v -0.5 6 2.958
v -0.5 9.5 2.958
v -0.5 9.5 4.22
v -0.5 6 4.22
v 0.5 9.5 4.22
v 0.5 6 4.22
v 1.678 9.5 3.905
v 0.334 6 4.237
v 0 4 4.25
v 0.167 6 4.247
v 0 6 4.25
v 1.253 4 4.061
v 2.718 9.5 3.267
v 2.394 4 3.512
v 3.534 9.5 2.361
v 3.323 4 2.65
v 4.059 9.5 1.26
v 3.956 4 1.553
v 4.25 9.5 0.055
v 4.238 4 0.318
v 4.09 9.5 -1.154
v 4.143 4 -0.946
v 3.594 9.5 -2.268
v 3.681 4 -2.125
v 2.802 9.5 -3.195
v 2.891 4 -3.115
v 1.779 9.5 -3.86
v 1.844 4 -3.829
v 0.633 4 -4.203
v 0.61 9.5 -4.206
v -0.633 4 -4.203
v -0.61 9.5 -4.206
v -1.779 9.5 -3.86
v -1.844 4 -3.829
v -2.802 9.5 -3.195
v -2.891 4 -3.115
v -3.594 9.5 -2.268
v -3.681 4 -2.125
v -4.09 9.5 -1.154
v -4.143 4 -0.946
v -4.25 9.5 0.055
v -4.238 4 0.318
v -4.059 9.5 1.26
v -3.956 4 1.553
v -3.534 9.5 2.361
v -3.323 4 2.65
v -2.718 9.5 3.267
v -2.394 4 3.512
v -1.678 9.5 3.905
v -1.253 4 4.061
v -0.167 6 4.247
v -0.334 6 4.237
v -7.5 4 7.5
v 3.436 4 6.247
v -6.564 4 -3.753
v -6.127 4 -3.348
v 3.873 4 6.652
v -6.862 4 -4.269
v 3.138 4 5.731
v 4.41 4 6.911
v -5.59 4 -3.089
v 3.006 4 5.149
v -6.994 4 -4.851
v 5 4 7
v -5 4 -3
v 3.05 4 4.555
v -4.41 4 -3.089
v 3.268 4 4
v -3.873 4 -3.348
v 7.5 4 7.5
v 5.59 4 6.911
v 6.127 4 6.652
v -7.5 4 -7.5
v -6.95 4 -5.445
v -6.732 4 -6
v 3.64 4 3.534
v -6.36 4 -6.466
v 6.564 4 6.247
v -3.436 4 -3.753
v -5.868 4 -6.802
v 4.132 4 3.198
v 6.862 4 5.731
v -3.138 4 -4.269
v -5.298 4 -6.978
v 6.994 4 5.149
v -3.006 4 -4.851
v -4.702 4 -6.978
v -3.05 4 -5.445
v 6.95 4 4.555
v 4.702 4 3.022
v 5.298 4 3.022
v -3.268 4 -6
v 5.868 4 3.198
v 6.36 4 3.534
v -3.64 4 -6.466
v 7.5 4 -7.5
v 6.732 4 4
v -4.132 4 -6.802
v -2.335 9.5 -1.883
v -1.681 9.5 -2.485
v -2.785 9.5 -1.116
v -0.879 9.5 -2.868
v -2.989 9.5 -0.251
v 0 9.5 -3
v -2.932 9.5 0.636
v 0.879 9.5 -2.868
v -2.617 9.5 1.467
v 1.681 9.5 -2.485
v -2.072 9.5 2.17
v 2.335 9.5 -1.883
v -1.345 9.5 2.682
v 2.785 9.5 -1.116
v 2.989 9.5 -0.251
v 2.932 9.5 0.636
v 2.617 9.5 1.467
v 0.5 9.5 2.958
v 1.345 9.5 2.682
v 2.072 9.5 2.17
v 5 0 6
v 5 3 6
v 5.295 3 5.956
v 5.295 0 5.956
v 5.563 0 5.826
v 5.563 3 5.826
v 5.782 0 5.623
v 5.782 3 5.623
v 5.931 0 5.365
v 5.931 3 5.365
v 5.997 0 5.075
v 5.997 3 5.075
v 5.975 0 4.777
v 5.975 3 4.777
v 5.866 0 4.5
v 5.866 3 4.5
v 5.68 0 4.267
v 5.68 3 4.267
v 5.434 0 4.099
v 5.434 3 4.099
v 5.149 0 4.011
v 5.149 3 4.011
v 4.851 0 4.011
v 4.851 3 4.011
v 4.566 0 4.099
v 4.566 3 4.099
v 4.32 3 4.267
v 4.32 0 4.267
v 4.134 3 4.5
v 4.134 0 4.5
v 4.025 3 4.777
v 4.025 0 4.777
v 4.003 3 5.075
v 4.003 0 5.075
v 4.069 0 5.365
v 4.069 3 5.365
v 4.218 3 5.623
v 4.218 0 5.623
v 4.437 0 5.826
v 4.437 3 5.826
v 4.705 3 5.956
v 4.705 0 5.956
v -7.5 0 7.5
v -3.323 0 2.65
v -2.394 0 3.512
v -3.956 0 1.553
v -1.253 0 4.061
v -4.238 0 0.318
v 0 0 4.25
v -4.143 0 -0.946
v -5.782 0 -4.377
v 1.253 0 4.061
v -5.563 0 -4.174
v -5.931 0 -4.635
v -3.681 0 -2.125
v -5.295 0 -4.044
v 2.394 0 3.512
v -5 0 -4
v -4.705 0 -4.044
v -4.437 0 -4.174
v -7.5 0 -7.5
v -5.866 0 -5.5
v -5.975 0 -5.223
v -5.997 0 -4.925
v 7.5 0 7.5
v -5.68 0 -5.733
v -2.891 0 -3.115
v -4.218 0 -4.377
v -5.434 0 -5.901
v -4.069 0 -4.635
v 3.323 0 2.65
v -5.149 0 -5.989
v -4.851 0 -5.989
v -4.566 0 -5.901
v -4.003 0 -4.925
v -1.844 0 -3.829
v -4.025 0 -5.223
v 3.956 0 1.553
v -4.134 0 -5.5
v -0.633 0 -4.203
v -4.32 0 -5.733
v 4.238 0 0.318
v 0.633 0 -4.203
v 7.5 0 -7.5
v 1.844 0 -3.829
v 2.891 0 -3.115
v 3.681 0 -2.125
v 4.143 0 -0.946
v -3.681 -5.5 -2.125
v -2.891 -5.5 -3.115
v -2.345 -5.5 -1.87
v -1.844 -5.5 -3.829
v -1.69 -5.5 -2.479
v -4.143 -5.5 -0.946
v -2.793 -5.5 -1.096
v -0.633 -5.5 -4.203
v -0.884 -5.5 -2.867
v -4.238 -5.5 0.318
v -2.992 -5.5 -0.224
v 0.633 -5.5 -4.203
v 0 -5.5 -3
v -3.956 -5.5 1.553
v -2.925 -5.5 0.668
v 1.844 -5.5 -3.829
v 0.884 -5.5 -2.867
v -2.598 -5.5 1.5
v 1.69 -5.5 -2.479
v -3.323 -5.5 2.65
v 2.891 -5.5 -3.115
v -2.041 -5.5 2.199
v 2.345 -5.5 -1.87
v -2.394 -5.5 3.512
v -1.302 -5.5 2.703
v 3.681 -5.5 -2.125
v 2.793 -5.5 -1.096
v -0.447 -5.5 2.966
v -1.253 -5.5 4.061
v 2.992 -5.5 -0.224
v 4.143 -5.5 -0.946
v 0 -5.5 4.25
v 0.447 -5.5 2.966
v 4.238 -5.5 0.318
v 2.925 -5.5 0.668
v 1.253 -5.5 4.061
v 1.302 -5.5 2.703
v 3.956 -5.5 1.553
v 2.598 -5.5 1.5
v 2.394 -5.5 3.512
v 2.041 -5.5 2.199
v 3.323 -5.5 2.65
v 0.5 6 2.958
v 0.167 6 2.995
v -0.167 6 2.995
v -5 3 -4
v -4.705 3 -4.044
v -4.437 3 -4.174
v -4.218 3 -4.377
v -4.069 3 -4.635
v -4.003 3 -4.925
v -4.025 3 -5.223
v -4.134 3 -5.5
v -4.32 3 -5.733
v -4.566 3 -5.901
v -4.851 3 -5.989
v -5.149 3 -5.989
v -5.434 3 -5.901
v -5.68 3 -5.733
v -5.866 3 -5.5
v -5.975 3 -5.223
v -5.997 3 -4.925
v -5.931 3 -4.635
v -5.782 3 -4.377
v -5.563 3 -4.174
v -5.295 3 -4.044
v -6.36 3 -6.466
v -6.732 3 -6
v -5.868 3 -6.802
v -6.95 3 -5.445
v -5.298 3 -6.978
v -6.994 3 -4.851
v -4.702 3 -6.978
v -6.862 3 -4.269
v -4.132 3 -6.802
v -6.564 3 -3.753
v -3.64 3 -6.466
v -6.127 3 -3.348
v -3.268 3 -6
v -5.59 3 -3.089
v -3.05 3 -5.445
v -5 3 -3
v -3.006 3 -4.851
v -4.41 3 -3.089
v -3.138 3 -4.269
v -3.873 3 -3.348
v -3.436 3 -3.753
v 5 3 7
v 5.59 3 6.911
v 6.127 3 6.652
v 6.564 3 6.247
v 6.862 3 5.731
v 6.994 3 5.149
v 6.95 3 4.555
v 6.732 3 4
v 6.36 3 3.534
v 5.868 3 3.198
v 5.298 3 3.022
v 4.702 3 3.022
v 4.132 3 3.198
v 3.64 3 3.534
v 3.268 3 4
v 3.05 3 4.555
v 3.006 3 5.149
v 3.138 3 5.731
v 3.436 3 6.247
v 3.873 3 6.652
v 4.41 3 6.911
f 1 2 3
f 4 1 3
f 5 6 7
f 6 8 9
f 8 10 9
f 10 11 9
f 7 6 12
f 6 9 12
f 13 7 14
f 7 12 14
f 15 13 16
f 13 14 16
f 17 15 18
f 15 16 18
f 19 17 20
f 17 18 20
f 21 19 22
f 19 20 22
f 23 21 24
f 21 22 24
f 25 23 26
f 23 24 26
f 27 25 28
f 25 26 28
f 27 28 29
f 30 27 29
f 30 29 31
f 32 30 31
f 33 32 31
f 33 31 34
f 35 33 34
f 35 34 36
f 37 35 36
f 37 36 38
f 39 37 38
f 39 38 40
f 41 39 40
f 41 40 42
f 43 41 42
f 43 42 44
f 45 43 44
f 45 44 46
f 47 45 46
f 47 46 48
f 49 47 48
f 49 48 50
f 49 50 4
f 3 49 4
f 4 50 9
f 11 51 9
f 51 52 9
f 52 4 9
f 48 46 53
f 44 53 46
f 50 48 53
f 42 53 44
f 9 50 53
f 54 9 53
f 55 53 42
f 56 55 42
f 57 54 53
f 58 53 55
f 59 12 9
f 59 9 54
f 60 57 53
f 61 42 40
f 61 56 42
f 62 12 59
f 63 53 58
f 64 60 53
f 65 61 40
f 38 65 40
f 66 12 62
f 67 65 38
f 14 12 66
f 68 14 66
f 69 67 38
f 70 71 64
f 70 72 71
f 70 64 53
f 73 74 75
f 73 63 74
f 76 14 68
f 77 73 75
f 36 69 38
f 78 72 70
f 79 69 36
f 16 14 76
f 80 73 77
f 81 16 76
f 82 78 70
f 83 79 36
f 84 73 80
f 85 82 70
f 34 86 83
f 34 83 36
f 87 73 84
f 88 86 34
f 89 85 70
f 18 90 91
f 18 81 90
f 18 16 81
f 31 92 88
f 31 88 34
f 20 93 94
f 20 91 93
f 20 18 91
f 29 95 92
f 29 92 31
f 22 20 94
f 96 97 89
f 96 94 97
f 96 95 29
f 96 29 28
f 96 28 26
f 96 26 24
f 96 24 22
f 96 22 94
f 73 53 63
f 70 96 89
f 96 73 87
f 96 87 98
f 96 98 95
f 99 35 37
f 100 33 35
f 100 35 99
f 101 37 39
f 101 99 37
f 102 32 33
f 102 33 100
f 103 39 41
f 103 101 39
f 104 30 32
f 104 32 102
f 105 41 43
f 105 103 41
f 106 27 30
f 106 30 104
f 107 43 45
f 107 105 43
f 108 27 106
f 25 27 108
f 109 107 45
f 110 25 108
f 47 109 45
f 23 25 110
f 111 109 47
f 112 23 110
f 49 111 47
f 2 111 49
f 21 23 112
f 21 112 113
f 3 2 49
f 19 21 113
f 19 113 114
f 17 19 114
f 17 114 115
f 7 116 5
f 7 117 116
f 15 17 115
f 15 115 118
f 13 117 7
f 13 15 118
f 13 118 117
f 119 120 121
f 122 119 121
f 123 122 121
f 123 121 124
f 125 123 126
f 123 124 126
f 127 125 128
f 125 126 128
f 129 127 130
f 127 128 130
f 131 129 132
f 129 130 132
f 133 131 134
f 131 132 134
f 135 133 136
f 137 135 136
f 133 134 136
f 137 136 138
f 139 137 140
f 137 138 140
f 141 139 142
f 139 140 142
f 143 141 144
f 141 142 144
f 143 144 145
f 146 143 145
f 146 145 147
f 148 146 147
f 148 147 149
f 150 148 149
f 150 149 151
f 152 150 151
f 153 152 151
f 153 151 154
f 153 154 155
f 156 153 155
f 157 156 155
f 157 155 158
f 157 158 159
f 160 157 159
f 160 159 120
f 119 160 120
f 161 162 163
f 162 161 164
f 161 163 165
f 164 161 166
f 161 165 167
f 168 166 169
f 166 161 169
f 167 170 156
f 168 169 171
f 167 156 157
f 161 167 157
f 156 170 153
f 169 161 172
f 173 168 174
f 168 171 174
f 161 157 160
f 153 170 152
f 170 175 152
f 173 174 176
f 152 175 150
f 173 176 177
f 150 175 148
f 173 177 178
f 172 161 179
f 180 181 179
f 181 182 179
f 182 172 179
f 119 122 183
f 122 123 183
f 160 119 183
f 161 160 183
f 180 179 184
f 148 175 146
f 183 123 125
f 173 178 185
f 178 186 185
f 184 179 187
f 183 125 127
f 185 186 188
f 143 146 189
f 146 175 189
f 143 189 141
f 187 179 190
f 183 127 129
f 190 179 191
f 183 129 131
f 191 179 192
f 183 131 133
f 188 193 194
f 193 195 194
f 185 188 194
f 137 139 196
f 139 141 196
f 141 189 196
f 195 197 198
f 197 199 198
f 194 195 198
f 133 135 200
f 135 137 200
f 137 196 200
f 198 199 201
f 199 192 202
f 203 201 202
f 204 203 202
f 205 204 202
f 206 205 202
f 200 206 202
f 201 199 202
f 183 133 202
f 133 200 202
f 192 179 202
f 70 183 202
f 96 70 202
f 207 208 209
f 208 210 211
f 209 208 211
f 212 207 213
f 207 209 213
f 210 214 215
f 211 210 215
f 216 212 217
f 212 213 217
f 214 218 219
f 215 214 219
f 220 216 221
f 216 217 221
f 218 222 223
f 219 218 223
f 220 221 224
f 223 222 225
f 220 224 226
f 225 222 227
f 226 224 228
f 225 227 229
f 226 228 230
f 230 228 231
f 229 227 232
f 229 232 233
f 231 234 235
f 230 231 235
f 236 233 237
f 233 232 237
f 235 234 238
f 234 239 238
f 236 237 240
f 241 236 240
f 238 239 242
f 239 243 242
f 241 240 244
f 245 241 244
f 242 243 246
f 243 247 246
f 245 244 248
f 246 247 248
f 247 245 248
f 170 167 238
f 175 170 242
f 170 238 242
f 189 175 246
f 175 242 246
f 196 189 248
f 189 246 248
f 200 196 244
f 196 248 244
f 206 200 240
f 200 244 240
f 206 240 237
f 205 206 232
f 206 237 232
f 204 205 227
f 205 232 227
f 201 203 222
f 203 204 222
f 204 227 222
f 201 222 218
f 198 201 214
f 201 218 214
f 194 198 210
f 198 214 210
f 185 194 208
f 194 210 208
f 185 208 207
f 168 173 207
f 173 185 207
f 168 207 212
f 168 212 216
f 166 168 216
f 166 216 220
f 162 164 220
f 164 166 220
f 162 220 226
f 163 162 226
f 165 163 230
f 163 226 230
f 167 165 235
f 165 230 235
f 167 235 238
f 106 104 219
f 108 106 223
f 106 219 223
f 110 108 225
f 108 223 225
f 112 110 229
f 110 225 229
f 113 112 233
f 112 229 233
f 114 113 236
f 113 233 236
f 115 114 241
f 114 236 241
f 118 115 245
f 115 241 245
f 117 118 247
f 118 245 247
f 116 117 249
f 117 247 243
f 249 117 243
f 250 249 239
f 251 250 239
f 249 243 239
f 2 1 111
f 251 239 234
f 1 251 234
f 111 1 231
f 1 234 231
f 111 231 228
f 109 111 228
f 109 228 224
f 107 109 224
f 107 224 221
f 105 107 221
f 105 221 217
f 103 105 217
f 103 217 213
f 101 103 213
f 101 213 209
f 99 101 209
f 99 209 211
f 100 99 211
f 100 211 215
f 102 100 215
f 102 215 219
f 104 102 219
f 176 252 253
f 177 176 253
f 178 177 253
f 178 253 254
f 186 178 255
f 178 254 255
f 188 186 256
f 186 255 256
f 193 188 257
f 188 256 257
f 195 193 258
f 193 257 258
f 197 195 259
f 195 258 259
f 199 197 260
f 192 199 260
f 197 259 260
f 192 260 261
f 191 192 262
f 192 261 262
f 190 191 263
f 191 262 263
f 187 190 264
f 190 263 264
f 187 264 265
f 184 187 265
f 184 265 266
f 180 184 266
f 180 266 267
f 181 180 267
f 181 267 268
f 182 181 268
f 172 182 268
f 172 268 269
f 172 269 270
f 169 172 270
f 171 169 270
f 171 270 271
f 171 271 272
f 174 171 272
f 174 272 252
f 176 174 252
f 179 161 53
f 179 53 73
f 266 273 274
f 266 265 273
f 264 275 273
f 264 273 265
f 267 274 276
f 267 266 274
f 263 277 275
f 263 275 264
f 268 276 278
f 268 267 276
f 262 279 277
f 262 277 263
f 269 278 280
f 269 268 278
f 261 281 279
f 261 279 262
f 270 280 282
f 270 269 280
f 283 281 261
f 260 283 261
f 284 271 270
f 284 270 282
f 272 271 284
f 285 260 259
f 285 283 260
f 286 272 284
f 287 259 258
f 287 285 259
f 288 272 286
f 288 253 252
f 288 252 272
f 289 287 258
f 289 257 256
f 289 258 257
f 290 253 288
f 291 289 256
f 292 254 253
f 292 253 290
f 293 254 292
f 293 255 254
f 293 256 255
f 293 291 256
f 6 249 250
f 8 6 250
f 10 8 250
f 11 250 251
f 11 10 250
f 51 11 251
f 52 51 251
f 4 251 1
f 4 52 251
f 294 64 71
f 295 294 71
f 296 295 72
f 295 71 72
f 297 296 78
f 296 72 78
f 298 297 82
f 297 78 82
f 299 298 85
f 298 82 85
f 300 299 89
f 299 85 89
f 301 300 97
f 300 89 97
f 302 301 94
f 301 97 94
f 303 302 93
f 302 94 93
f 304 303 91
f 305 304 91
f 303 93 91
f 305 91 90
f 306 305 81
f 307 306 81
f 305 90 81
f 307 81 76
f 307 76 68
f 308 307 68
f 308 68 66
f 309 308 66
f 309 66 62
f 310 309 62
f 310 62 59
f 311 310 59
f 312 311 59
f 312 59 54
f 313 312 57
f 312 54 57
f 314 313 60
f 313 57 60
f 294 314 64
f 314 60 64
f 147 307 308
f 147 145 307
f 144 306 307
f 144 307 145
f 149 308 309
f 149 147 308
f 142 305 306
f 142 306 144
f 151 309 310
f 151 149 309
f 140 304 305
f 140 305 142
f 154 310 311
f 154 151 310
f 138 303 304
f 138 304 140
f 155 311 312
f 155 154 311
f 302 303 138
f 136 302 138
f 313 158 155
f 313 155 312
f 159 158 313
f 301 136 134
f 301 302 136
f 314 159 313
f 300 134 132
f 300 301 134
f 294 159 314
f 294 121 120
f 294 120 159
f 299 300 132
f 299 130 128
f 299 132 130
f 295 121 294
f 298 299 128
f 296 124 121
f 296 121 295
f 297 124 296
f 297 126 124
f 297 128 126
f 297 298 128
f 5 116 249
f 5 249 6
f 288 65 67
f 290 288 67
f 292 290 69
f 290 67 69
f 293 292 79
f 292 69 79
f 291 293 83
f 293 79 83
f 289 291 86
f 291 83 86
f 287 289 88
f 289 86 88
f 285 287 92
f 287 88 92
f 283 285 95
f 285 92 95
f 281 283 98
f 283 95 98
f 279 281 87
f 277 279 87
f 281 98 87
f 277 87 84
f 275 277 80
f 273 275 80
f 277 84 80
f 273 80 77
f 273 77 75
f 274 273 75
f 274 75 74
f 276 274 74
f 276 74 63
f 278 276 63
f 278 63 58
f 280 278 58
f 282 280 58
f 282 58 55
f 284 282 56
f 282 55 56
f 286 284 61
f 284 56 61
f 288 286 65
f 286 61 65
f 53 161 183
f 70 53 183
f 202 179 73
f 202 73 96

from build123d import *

# Parameters (mm, degrees)
SKETCH_1_W           = 15
SKETCH_1_H           = 15
EXTRUDE_1_DEPTH      = 4
EXTRUDE_2_DEPTH      = 5.5
EXTRUDE_2_DEPTH_BACK = 9.5
SKETCH_2_R           = 4.25
SKETCH_5_R           = 3
CUT_EXTRUDE_3_DEPTH  = 19.371173071
SKETCH_3_R           = 1
CUT_EXTRUDE_1_DEPTH  = 15.239030866
SKETCH_4_R           = 2
CUT_EXTRUDE_2_DEPTH  = 1
SKETCH_6_W           = 1
SKETCH_6_H           = 2.949438202
CUT_EXTRUDE_4_DEPTH  = 3.5


with BuildPart() as part:
    # 草图1 → 拉伸1 (new body)
    with BuildSketch(Plane(origin=(0, 0, 0), x_dir=(1, 0, 0), z_dir=(0, 1, 0))):
        Rectangle(SKETCH_1_W, SKETCH_1_H)
    extrude(amount=EXTRUDE_1_DEPTH)

    # 草图2 → 拉伸2 (add, two sides: drawn at the far end of the back side and taken through both)
    with BuildSketch(Plane(origin=(0, 4, 0), x_dir=(-1, 0, 0), z_dir=(0, 1, 0)).offset(-EXTRUDE_2_DEPTH_BACK)):
        with Locations(Location((0, 0, 0), (0, 0, 90))):
            Circle(SKETCH_2_R)
    extrude(amount=EXTRUDE_2_DEPTH + EXTRUDE_2_DEPTH_BACK)

    # 草图5 → 切除-拉伸3 (cut, through all)
    with BuildSketch(Plane.XZ.offset(5.5)):
        with Locations(Location((0, 0, 0), (0, 0, 270))):
            Circle(SKETCH_5_R)
    extrude(amount=-CUT_EXTRUDE_3_DEPTH, mode=Mode.SUBTRACT)

    # 草图3 → 切除-拉伸1 (cut, through all)
    with BuildSketch(Plane(origin=(0, 4, 0), x_dir=(-1, 0, 0), z_dir=(0, 1, 0))):
        with Locations(Location((5, -5, 0), (0, 0, 90))):
            Circle(SKETCH_3_R)
        with Locations(Location((-5, 5, 0), (0, 0, 90))):
            Circle(SKETCH_3_R)
    extrude(amount=-CUT_EXTRUDE_1_DEPTH, mode=Mode.SUBTRACT)

    # 草图4 → 切除-拉伸2 (cut)
    with BuildSketch(Plane(origin=(0, 4, 0), x_dir=(-1, 0, 0), z_dir=(0, 1, 0))):
        with Locations(Location((5, -5, 0), (0, 0, 90))):
            Circle(SKETCH_4_R)
        with Locations(Location((-5, 5, 0), (0, 0, 90))):
            Circle(SKETCH_4_R)
    extrude(amount=-CUT_EXTRUDE_2_DEPTH, mode=Mode.SUBTRACT)

    # 草图6 → 切除-拉伸4 (cut)
    with BuildSketch(Plane(origin=(0, 9.5, 0), x_dir=(-1, 0, 0), z_dir=(0, 1, 0))):
        with Locations((0, 3.651685393)):
            Rectangle(SKETCH_6_W, SKETCH_6_H)
    extrude(amount=-CUT_EXTRUDE_4_DEPTH, mode=Mode.SUBTRACT)


solid = part.part
